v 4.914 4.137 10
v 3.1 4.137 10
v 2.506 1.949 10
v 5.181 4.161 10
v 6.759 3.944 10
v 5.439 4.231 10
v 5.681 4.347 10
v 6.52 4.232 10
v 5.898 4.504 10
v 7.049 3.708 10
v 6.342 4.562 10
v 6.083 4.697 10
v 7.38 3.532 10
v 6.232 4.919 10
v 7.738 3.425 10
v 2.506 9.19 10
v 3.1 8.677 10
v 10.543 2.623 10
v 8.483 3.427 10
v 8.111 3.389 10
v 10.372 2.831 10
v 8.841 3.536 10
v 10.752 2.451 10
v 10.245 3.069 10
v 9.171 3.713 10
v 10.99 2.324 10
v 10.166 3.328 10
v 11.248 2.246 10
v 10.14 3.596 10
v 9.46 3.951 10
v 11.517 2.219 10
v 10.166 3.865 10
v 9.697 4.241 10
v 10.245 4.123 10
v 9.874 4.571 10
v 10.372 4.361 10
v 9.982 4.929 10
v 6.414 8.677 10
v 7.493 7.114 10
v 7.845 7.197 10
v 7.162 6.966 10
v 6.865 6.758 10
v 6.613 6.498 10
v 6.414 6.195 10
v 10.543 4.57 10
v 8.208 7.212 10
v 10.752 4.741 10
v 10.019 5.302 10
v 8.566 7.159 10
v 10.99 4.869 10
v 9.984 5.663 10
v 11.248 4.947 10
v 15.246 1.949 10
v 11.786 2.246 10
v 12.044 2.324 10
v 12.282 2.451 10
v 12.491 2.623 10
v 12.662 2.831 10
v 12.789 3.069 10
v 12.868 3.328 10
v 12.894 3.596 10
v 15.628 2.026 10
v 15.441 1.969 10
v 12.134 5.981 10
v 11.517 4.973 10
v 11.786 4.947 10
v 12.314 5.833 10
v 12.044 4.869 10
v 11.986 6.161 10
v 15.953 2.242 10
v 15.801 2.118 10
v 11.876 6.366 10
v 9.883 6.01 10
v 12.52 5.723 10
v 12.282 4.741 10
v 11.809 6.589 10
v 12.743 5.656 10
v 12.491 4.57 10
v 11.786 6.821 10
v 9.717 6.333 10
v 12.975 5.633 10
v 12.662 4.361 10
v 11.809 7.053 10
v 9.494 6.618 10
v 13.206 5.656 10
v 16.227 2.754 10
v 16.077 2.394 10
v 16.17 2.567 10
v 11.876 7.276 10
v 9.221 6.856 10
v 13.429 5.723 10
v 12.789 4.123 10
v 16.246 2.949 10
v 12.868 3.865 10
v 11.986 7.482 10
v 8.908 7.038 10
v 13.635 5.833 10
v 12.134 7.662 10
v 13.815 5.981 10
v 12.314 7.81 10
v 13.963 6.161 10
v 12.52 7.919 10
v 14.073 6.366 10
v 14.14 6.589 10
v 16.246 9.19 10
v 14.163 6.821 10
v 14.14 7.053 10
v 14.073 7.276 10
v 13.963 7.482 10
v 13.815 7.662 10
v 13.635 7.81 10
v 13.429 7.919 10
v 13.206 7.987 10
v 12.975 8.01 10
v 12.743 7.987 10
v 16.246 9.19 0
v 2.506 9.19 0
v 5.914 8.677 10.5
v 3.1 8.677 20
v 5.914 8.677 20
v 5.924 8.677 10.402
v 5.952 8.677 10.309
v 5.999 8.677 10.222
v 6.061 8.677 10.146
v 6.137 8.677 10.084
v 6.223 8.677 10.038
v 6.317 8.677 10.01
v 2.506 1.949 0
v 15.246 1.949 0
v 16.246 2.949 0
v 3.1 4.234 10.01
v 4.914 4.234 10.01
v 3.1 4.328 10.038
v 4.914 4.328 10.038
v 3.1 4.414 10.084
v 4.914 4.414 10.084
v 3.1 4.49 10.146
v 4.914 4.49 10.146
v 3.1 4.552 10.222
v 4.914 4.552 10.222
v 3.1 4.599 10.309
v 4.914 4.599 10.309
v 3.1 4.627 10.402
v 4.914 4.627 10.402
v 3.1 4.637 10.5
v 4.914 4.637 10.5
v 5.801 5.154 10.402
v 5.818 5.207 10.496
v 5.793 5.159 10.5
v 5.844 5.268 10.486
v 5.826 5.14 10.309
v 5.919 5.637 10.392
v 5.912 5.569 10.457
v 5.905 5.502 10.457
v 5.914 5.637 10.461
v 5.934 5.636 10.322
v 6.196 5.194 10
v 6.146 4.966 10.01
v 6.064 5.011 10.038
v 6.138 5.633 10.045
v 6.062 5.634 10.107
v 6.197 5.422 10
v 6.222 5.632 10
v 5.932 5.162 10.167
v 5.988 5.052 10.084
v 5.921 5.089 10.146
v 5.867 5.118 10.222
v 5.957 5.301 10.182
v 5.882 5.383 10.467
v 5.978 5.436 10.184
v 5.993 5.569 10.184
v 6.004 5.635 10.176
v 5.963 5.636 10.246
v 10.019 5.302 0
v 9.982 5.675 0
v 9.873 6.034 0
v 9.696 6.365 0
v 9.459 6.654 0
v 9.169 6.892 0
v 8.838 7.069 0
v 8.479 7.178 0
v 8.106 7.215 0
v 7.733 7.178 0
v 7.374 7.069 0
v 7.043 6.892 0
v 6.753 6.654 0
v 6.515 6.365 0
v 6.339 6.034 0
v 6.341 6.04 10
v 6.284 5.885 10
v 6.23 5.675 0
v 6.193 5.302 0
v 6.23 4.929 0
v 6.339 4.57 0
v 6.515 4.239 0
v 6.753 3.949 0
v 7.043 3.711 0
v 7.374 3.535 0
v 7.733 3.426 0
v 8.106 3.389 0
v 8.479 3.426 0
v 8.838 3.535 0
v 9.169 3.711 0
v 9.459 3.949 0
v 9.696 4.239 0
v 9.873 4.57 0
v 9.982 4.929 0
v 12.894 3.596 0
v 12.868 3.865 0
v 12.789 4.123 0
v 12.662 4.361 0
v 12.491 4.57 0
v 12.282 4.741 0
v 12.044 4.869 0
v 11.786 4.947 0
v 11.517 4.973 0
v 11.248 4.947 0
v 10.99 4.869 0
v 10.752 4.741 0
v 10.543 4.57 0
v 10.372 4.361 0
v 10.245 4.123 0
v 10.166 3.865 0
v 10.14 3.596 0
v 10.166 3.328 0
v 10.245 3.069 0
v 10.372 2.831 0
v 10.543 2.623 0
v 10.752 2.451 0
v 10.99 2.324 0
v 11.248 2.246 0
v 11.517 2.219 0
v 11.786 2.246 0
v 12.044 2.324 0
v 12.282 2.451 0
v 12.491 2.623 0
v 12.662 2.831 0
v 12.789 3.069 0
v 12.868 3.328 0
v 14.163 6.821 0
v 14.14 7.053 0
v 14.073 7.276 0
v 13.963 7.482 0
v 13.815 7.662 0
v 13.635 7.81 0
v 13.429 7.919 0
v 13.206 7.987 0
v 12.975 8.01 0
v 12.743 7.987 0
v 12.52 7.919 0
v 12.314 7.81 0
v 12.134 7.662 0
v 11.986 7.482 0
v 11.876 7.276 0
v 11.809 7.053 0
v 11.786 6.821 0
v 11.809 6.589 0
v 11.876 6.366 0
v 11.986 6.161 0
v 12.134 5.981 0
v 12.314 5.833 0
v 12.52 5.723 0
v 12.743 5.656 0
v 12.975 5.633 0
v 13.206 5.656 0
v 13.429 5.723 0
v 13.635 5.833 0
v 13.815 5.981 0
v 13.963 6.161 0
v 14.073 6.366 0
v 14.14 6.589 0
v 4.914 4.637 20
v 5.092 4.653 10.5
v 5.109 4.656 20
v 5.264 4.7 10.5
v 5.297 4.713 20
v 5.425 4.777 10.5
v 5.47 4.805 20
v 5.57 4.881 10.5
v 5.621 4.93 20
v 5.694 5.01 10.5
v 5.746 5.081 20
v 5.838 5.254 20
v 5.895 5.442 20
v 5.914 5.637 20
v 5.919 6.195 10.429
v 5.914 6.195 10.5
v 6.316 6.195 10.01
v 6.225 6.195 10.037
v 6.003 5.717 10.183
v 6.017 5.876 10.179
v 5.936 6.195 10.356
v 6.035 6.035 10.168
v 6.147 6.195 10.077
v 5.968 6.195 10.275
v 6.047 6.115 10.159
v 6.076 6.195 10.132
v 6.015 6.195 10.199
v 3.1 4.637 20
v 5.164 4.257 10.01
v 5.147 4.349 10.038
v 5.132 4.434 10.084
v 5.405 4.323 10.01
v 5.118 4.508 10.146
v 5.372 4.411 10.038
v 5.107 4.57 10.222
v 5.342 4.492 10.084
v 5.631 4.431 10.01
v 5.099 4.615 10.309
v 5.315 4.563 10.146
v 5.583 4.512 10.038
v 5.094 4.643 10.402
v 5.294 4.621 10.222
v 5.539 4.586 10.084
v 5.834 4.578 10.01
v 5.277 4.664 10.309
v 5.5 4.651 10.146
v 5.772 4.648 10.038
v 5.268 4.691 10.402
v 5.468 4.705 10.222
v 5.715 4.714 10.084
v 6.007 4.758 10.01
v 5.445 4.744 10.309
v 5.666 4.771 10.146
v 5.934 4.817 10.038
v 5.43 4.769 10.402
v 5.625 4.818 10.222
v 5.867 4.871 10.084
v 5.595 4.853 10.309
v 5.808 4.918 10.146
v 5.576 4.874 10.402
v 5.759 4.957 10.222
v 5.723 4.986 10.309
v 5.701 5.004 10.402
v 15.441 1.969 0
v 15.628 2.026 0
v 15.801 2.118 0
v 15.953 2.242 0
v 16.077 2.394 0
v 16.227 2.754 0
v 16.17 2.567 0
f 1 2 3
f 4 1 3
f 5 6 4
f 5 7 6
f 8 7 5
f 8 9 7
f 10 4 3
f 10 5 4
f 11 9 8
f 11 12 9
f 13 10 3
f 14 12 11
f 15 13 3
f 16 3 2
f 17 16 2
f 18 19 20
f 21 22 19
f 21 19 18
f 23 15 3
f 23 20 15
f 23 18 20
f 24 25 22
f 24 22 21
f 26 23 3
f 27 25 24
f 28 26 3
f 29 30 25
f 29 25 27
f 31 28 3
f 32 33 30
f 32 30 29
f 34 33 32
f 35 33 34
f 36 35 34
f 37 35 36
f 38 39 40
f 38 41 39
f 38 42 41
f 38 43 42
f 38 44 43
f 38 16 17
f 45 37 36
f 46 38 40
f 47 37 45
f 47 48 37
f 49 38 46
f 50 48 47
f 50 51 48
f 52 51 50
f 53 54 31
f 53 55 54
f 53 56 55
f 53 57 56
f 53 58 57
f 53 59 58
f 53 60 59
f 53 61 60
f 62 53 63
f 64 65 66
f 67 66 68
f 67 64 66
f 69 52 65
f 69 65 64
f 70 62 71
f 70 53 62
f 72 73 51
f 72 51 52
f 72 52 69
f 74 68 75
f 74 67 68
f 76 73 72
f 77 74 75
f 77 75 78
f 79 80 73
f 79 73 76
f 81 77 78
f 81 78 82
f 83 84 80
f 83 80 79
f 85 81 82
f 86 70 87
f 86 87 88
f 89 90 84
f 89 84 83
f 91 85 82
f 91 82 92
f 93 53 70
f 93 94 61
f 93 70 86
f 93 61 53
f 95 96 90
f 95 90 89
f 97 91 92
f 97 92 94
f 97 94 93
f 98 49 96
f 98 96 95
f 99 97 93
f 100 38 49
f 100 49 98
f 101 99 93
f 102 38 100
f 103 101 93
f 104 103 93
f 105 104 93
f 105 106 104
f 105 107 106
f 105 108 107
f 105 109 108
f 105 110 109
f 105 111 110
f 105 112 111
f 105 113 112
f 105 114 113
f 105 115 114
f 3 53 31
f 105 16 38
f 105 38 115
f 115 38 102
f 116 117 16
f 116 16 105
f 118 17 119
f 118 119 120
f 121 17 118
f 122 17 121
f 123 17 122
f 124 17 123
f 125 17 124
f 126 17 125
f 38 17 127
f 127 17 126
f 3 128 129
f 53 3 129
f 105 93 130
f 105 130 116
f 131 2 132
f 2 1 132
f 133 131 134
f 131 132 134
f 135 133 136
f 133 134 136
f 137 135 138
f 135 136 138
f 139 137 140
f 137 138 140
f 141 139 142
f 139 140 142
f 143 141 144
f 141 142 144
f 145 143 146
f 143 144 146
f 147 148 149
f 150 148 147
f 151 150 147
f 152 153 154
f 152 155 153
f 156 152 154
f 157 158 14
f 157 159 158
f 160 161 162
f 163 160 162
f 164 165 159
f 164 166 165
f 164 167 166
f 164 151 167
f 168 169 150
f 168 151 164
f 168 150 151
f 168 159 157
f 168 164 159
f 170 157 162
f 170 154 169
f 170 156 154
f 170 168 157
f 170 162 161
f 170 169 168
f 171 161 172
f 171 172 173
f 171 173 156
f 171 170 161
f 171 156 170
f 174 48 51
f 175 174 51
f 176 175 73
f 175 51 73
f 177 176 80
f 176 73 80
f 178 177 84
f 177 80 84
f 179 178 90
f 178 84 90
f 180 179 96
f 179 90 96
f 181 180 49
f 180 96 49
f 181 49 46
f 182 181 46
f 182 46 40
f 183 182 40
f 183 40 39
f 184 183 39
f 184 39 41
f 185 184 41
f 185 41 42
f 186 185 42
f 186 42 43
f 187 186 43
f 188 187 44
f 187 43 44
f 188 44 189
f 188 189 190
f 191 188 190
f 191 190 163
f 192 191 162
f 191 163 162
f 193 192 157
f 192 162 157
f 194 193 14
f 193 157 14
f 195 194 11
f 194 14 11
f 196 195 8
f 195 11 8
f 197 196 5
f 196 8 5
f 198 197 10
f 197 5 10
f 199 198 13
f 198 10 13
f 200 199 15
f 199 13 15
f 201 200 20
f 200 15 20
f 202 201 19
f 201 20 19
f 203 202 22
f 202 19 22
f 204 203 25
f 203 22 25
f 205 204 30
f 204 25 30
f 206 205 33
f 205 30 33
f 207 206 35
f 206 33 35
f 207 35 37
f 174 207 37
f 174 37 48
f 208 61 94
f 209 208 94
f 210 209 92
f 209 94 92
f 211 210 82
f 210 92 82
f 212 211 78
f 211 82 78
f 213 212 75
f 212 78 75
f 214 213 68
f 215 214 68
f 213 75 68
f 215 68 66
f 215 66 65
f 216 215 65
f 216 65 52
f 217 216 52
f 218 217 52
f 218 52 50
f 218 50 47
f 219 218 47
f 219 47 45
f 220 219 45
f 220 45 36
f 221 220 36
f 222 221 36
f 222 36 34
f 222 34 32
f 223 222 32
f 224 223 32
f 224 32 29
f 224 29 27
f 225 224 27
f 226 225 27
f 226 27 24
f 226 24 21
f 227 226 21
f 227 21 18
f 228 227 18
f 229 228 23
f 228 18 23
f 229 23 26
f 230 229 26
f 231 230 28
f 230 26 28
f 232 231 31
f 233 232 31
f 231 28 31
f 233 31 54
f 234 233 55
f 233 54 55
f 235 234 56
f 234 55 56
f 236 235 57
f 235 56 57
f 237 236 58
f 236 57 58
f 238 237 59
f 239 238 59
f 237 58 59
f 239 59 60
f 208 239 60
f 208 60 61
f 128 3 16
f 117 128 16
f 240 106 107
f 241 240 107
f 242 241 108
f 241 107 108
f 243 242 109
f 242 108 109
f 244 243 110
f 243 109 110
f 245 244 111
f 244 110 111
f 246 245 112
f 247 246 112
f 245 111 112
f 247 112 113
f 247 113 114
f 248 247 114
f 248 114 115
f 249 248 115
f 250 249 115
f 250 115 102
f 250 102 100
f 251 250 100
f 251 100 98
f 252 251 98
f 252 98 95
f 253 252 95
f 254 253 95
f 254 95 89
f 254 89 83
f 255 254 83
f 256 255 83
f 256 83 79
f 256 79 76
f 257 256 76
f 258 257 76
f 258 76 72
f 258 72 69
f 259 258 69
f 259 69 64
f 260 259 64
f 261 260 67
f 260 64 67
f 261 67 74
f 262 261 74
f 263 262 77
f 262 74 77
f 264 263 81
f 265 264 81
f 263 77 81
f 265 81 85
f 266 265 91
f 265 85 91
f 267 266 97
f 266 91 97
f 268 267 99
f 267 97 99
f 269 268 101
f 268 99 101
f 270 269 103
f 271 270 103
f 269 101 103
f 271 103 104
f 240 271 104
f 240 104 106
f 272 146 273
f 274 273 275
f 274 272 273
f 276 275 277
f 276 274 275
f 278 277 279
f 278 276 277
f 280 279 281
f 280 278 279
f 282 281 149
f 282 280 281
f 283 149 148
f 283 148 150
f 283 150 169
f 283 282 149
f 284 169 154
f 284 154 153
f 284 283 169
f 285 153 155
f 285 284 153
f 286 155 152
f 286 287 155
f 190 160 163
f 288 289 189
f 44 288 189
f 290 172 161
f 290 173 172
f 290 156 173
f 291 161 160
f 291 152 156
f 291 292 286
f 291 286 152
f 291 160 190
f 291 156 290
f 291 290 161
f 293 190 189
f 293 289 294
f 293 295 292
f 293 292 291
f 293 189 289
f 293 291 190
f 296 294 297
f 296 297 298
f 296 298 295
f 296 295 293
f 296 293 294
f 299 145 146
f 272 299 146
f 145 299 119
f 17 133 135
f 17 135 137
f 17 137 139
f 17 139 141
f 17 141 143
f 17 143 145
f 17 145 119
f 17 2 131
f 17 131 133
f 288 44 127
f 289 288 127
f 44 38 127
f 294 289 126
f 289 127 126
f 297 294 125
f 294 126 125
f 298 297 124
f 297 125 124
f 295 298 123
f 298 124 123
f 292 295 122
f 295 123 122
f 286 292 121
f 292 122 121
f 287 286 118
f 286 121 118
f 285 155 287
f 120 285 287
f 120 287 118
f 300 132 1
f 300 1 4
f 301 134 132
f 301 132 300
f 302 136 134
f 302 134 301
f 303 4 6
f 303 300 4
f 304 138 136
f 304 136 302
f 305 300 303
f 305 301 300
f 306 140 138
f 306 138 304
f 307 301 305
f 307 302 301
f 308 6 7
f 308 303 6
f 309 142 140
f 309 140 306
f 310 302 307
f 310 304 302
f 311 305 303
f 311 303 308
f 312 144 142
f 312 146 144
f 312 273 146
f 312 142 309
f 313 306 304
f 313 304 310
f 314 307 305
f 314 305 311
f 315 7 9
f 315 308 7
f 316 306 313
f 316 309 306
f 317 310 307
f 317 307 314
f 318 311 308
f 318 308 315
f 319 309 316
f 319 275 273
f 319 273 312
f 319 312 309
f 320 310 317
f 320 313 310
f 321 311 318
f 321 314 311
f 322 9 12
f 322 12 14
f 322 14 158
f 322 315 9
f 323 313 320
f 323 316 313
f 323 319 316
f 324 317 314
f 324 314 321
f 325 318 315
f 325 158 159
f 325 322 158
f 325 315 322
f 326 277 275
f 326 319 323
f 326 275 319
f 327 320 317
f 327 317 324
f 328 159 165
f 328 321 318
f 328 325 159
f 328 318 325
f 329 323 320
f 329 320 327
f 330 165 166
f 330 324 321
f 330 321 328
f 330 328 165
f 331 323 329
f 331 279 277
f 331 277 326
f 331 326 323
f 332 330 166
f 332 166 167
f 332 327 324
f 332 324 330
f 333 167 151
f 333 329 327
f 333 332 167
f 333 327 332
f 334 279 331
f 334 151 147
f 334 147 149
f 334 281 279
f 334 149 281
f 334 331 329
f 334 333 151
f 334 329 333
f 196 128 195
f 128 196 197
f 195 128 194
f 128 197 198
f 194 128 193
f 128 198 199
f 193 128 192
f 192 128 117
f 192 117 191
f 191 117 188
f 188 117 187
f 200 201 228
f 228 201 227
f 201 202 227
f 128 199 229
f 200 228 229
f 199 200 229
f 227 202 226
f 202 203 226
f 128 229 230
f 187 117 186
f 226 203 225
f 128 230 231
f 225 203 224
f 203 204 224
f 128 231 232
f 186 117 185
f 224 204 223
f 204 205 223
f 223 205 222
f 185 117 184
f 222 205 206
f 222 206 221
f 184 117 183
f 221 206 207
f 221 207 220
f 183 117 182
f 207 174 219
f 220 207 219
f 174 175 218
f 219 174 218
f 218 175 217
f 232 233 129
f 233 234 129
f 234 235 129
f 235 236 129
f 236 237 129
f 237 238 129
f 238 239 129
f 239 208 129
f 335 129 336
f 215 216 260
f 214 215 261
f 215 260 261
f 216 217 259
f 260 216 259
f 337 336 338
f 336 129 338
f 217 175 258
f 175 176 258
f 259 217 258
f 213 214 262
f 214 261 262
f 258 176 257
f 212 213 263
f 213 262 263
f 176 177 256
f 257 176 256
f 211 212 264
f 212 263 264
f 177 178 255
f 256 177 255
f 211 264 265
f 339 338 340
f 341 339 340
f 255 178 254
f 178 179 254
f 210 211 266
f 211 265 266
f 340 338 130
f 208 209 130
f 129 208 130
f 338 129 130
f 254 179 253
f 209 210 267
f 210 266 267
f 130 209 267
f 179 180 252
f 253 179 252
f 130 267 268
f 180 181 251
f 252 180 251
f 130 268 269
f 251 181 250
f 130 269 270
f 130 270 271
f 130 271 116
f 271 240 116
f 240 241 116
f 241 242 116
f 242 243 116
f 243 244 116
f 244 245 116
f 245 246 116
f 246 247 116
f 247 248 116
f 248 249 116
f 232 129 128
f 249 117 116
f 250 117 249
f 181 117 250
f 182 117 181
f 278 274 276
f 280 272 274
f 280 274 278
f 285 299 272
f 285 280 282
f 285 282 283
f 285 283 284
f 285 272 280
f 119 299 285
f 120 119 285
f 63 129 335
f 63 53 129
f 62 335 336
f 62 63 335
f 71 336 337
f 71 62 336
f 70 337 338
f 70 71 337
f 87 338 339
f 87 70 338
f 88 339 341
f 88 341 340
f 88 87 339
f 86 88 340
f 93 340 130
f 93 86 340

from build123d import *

# Parameters (mm, degrees)
SKETCH_W        = 13.739303
SKETCH_H        = 7.240993
PAD_DEPTH       = 10
FILLET_R        = 1
SKETCH001_R     = 1.912834
POCKET_DEPTH    = 10.001
SKETCH002_R     = 1.188533
SKETCH002_R_2   = 1.377063
POCKET001_DEPTH = 10.001
SKETCH003_W     = 2.814273
SKETCH003_H     = 4.040293
PAD001_DEPTH    = 10
FILLET001_R     = 1
FILLET002_R     = 0.5


with BuildPart() as part:
    # Sketch → Pad (new body)
    with BuildSketch(Plane.XY):
        with Locations((9.376143, 5.56999)):
            Rectangle(SKETCH_W, SKETCH_H)
    extrude(amount=PAD_DEPTH)

    # Fillet
    fillet_edges = [part.edges().sort_by_distance(p)[0] for p in [
        (16.245794, 1.949493, 5),
    ]]
    fillet(fillet_edges, radius=FILLET_R)

    # Sketch001 → Pocket (cut, through all)
    with BuildSketch(Plane.XY.offset(10)):
        with Locations((8.105963, 5.301824)):
            Circle(SKETCH001_R)
    extrude(amount=-POCKET_DEPTH, mode=Mode.SUBTRACT)

    # Sketch002 → Pocket001 (cut, through all)
    with BuildSketch(Plane.XY.offset(10)):
        with Locations((12.974515, 6.821315)):
            Circle(SKETCH002_R)
        with Locations((11.517051, 3.596284)):
            Circle(SKETCH002_R_2)
    extrude(amount=-POCKET001_DEPTH, mode=Mode.SUBTRACT)

    # Sketch003 → Pad001 (new body)
    with BuildSketch(Plane.XY.offset(10)):
        with Locations((4.507165, 6.656808)):
            Rectangle(SKETCH003_W, SKETCH003_H)
    extrude(amount=PAD001_DEPTH)

    # Fillet001
    fillet001_edges = [part.edges().sort_by_distance(p)[0] for p in [
        (5.914301, 4.636662, 15),
    ]]
    fillet(fillet001_edges, radius=FILLET001_R)

    # Fillet002
    fillet002_edges = [part.edges().sort_by_distance(p)[0] for p in [
        (5.914301, 7.156809, 10),
        (5.621408, 4.929555, 10),
        (4.007165, 4.636662, 10),
    ]]
    fillet(fillet002_edges, radius=FILLET002_R)


solid = part.part
